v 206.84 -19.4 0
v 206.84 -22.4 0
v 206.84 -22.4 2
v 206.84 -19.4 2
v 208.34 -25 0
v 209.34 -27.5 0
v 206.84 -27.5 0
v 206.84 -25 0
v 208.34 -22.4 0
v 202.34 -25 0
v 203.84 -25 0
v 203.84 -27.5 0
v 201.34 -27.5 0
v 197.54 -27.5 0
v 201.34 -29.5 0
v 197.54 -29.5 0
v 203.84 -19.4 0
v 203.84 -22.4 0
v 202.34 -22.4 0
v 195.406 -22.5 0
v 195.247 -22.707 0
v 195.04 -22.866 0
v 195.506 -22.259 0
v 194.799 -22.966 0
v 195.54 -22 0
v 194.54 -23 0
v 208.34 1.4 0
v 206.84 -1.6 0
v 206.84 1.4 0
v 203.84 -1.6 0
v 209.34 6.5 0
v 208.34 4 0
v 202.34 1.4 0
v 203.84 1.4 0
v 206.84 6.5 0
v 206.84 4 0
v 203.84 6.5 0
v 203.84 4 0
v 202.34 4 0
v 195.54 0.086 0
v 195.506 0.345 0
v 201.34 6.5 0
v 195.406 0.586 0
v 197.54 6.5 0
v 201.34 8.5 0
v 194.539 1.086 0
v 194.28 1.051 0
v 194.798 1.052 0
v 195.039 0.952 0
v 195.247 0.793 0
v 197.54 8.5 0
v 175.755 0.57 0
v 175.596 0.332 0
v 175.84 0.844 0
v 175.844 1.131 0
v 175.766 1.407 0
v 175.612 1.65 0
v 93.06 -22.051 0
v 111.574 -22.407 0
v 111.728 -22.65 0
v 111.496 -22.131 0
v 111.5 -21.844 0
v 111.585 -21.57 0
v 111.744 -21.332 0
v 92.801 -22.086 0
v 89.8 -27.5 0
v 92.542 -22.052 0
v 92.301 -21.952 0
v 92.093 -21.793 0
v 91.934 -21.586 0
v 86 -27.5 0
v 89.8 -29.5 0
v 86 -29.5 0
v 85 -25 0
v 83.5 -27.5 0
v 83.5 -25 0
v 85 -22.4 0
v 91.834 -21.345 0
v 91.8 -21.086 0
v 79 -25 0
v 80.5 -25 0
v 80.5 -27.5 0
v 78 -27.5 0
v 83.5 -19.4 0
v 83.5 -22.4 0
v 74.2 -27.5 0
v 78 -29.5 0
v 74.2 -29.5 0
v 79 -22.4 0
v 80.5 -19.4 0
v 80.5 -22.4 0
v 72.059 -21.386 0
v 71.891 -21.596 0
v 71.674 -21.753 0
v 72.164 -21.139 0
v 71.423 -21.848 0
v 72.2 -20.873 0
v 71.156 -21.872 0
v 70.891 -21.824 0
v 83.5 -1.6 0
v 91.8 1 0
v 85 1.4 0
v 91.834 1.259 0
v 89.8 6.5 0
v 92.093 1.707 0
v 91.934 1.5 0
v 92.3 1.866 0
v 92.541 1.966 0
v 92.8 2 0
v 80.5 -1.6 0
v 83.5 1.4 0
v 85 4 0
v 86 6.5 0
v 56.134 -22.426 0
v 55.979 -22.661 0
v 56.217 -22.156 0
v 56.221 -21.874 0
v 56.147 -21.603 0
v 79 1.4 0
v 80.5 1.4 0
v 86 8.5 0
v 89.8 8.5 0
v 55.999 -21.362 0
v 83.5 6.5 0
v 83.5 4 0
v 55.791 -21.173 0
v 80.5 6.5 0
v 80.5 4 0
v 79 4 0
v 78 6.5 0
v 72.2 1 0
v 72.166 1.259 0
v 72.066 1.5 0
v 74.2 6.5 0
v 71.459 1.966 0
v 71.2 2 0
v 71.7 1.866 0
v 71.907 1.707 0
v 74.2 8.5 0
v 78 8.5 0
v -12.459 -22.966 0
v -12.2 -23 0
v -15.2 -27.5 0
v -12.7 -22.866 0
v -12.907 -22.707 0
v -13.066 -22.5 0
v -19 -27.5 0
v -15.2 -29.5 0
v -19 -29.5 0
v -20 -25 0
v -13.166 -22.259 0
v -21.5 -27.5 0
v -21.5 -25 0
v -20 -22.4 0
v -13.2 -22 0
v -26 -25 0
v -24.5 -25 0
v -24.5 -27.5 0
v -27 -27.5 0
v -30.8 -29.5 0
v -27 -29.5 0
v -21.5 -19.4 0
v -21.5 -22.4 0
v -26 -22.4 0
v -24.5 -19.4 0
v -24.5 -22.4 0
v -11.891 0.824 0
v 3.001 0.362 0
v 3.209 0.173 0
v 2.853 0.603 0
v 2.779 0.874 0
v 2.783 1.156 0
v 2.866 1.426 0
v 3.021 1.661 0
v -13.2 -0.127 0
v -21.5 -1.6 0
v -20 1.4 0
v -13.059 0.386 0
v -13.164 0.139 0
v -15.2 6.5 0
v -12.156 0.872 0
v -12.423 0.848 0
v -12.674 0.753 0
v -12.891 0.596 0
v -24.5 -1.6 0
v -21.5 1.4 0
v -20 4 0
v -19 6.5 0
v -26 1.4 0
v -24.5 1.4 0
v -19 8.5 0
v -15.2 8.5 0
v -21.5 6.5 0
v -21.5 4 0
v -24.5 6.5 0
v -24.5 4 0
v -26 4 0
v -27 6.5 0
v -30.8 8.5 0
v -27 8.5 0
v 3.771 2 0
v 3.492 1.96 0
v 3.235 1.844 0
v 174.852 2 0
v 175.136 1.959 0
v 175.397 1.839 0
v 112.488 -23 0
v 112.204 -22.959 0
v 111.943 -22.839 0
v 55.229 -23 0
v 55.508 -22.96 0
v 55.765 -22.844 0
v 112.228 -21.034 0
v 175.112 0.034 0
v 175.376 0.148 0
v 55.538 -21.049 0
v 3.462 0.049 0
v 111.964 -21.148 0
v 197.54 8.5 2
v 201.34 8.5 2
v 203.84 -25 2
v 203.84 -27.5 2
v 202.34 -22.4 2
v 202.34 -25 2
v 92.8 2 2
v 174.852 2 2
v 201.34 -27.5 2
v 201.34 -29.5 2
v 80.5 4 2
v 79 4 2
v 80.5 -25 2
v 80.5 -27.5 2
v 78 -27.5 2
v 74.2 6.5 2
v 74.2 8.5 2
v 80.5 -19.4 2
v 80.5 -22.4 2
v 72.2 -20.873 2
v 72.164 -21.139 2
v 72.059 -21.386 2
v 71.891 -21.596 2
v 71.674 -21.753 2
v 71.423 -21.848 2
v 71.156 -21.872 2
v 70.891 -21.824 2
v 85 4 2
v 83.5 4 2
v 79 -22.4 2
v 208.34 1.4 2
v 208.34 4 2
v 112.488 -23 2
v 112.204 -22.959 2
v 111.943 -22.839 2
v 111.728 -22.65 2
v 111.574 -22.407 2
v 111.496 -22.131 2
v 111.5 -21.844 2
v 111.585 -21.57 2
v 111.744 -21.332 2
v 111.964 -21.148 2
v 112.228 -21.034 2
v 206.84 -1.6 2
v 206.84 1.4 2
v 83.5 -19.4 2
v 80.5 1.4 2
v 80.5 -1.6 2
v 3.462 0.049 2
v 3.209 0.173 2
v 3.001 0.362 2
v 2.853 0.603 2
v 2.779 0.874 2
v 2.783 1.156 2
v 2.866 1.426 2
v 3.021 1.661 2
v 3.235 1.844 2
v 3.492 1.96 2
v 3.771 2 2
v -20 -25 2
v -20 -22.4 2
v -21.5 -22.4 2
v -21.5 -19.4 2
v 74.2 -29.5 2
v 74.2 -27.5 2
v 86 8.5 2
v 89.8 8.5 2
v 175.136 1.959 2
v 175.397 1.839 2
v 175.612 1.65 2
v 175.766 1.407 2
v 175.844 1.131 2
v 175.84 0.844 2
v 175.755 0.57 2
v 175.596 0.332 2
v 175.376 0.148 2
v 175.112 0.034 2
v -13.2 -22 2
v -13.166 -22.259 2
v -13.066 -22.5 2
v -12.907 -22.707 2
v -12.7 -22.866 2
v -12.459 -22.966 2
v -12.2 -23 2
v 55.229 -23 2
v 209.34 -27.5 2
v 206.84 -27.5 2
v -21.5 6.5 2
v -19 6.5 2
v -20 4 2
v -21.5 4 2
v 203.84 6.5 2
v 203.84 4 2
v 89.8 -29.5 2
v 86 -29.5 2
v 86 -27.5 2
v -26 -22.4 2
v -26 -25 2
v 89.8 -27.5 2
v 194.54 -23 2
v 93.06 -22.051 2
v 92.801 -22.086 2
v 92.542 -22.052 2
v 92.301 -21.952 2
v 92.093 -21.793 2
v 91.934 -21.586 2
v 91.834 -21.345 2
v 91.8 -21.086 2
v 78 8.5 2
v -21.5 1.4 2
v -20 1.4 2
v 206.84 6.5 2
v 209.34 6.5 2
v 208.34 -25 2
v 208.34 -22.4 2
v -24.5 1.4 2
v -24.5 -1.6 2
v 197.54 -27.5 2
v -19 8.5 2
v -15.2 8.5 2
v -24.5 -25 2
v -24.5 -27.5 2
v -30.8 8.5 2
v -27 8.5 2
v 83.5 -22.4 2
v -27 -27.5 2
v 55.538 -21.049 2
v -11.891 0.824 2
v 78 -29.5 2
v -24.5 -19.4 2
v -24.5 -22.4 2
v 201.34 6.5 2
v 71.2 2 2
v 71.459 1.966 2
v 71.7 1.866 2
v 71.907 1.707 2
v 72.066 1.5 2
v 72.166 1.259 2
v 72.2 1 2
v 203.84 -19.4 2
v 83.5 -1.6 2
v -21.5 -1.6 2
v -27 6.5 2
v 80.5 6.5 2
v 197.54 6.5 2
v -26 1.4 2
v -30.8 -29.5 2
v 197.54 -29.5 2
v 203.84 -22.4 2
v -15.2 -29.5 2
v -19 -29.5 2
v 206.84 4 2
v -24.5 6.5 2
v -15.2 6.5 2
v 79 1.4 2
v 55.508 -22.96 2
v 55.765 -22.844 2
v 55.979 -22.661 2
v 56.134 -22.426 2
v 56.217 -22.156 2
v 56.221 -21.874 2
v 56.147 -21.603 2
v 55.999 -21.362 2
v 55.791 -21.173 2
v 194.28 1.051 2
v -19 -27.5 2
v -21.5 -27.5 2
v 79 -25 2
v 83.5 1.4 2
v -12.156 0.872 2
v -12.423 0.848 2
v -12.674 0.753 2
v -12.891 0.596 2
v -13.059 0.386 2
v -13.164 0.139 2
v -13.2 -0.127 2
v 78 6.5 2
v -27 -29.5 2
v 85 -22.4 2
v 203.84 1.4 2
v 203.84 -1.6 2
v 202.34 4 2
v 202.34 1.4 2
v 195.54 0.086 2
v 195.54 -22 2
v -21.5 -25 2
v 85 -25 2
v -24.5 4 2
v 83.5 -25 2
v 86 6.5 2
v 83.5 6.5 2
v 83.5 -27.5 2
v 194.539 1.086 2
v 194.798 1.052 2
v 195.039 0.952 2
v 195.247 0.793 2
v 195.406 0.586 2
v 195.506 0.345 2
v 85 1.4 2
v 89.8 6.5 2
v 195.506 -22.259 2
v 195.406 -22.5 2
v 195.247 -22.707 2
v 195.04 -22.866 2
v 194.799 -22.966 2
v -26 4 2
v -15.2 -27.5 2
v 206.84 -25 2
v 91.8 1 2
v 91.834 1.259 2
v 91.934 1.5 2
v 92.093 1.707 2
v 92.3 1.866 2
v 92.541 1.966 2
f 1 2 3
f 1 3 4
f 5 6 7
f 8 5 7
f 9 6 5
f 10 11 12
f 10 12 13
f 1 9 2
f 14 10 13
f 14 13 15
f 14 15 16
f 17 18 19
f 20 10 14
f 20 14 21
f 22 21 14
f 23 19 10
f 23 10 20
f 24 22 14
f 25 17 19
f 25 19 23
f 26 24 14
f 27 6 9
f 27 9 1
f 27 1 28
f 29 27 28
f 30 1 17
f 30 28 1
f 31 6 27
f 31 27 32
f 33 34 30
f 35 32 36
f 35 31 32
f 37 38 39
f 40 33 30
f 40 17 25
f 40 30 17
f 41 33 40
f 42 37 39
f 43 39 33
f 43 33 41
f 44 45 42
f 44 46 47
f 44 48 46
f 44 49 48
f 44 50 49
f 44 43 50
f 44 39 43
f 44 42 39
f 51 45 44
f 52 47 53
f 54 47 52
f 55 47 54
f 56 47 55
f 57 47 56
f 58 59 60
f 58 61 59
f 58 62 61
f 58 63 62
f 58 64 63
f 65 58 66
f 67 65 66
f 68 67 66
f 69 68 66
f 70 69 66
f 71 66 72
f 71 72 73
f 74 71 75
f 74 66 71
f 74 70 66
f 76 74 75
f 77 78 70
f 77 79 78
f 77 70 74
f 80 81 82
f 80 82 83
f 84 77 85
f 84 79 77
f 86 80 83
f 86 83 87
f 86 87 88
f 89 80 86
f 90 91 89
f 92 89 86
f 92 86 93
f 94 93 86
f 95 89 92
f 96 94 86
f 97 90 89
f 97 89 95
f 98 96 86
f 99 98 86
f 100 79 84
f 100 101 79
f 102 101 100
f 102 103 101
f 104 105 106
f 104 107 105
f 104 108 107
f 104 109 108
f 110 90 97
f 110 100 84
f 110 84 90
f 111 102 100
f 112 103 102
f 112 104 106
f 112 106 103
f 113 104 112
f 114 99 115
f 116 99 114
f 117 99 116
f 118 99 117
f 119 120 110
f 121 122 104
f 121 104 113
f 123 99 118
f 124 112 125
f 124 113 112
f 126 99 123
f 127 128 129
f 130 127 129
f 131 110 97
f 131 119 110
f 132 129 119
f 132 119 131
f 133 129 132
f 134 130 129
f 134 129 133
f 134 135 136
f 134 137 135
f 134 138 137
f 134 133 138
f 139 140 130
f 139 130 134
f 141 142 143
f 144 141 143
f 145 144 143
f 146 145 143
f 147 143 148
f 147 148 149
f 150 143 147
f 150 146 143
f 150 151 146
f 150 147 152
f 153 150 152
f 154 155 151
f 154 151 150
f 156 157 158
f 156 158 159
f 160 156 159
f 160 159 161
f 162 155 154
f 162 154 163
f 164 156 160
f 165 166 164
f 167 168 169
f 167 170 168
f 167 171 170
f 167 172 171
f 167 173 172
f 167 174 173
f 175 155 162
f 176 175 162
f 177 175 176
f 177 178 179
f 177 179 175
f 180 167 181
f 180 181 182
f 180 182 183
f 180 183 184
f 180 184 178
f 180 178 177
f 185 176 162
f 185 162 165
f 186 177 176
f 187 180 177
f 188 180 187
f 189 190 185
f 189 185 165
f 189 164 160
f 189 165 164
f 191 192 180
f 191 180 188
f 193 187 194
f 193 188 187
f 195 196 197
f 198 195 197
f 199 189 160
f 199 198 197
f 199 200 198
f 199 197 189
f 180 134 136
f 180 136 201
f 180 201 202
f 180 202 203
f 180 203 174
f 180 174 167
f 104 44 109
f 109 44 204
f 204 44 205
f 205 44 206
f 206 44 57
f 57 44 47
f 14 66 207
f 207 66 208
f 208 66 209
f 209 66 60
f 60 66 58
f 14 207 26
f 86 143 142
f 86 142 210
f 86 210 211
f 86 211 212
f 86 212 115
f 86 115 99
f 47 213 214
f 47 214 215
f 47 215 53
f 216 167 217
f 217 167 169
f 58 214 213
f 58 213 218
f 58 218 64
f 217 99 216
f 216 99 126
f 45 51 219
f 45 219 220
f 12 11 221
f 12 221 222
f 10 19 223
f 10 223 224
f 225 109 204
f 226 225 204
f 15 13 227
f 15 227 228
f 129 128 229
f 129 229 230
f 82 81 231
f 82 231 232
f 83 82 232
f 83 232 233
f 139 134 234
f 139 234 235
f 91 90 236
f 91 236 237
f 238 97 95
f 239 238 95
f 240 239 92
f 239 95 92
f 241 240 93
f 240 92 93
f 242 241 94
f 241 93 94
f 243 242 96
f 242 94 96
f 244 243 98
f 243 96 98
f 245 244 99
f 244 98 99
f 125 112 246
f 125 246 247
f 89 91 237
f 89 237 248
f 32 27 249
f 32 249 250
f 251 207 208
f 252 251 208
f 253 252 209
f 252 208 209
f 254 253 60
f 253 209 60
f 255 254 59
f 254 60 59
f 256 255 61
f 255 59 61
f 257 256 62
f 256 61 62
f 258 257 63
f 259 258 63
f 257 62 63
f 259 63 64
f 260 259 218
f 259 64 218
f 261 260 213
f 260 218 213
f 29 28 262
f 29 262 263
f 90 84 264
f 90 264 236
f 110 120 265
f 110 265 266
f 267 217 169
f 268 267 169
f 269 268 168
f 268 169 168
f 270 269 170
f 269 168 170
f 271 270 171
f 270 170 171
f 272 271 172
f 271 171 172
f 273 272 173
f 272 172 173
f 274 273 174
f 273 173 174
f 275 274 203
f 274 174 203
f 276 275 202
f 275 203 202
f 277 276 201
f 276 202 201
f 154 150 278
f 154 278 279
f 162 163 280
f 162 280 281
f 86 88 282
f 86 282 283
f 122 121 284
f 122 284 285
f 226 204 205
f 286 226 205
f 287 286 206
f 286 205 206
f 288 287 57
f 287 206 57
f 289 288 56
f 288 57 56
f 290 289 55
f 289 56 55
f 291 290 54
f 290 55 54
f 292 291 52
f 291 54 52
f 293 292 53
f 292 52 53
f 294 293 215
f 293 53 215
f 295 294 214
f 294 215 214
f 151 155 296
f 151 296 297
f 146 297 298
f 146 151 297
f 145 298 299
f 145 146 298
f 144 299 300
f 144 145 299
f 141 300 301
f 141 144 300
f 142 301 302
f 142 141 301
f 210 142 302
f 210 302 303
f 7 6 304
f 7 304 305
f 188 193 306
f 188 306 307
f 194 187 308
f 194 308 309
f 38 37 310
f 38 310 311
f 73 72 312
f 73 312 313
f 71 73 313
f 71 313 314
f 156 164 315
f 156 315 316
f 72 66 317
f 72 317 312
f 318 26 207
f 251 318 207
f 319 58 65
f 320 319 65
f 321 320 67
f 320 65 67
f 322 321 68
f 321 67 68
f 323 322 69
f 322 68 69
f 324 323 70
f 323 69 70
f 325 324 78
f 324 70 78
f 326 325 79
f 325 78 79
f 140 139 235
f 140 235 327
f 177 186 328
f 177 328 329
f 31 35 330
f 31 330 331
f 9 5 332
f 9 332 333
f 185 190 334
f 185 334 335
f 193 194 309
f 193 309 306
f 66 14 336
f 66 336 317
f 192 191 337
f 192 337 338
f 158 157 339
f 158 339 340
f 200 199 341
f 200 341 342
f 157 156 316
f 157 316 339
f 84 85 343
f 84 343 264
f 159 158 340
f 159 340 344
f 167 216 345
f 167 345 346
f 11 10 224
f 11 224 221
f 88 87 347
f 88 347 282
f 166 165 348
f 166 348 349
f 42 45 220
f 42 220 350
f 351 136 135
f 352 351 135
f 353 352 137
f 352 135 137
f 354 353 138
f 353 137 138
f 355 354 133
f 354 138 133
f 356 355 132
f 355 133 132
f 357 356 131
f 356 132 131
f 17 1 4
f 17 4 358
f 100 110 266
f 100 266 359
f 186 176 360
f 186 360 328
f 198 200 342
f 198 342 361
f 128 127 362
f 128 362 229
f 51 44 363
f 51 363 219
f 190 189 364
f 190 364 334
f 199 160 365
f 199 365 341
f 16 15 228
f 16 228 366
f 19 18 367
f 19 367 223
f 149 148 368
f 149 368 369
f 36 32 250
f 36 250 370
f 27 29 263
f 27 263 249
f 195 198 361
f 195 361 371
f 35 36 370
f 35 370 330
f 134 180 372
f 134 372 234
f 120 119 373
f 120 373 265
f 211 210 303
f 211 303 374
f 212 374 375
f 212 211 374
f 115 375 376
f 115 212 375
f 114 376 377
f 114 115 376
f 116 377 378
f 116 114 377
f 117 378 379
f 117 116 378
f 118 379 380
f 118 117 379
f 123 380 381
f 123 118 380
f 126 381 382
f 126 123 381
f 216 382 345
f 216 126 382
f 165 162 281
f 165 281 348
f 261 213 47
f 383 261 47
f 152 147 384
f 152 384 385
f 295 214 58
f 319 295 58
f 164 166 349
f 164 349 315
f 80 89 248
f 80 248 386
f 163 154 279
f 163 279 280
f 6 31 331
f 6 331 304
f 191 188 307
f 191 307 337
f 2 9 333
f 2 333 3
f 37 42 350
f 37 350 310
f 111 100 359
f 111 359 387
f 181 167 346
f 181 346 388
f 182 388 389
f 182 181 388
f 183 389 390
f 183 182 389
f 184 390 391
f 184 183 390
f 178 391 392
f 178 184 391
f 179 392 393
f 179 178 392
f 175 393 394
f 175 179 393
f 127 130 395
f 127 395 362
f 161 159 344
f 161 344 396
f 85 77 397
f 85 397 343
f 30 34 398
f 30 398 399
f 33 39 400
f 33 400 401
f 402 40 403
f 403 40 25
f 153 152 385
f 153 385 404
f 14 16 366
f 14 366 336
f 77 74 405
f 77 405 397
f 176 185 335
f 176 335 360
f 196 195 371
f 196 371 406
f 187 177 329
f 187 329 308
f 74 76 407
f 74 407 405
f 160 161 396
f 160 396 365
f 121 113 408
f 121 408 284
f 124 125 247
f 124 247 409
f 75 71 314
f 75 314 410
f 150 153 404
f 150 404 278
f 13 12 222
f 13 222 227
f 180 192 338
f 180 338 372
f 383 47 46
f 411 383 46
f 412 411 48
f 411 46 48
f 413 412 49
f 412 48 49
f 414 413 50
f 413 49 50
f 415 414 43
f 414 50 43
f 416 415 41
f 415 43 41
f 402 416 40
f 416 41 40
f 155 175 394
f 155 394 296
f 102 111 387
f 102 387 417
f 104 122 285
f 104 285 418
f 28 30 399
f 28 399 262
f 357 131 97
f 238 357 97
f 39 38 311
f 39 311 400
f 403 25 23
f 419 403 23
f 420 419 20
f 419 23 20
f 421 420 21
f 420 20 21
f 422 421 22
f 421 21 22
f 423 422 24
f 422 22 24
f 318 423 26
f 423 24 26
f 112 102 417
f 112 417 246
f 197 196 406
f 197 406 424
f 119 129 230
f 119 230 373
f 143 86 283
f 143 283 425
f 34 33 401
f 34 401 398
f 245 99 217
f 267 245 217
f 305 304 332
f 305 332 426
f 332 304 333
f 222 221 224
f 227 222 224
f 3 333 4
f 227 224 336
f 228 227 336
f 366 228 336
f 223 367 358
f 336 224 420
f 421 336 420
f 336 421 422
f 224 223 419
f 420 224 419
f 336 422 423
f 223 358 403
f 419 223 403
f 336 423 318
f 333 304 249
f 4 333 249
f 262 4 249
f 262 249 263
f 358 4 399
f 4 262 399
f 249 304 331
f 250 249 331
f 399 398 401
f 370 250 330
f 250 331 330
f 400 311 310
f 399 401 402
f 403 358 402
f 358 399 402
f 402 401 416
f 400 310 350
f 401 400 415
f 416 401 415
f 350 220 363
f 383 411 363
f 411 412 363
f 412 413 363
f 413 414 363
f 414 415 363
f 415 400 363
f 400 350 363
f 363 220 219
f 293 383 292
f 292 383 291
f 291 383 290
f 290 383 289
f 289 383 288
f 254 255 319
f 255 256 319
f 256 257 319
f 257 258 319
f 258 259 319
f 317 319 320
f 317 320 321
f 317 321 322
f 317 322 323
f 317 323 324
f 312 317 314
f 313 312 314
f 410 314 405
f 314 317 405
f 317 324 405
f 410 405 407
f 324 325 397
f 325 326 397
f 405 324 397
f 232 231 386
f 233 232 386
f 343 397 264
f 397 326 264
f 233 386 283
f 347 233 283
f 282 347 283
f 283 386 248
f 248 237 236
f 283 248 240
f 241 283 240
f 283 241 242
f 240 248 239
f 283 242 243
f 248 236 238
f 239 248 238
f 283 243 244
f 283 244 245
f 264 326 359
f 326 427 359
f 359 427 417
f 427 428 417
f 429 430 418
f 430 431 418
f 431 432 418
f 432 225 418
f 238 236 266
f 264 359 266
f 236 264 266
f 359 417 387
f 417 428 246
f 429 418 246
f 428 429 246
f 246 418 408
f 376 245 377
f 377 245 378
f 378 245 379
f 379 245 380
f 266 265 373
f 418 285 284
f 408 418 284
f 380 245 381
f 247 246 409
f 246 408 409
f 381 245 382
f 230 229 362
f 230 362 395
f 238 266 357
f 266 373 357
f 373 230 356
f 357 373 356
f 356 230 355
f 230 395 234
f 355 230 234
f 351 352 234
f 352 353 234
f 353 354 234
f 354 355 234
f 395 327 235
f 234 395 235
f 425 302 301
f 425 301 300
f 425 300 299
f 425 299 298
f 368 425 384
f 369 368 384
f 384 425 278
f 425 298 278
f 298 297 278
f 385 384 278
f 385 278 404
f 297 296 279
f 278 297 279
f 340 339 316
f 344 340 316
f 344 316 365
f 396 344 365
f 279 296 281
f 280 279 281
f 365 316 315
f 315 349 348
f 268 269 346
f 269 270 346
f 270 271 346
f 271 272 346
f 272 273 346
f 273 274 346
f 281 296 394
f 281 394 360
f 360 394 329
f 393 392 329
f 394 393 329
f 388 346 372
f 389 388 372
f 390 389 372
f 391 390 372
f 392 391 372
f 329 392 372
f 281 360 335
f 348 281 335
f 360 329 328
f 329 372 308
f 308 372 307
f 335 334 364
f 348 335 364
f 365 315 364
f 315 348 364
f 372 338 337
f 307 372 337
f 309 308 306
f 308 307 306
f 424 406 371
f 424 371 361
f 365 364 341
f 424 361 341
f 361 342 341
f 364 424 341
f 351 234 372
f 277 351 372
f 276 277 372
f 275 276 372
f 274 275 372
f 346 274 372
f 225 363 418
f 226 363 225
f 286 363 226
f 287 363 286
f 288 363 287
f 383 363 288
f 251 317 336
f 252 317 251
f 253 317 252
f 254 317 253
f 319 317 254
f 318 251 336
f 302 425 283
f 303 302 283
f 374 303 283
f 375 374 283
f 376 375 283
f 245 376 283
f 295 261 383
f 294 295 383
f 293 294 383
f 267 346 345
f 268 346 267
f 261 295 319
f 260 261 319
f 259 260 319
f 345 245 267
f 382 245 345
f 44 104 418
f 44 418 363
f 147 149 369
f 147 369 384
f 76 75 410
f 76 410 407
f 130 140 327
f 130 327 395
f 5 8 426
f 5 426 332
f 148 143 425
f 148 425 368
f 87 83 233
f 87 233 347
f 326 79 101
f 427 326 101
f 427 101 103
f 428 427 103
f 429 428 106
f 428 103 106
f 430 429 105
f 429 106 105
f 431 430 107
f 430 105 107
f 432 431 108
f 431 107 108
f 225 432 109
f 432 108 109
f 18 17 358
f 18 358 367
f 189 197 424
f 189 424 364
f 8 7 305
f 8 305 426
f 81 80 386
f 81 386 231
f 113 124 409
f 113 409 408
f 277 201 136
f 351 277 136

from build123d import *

# Parameters (mm, degrees)
EXTRUDE_1_DEPTH = 2


with BuildPart() as part:
    # 草图2 → 凸台-拉伸1 (new body)
    with BuildSketch(Plane.XY):
        Polygon((-15.2, 6.5), (74.2, 6.5), (74.2, 8.5), (78, 8.5), (78, 6.5), (80.5, 6.5), (80.5, 4), (79, 4), (79, 1.4), (80.5, 1.4), (80.5, -1.6), (83.5, -1.6), (83.5, 1.4), (85, 1.4), (85, 4), (83.5, 4), (83.5, 6.5), (86, 6.5), (86, 8.5), (89.8, 8.5), (89.8, 6.5), (197.54, 6.5), (197.54, 8.5), (201.34, 8.5), (201.34, 6.5), (203.84, 6.5), (203.84, 4), (202.34, 4), (202.34, 1.4), (203.84, 1.4), (203.84, -1.6), (206.84, -1.6), (206.84, 1.4), (208.34, 1.4), (208.34, 4), (206.84, 4), (206.84, 6.5), (209.34, 6.5), (209.34, -27.5), (206.84, -27.5), (206.84, -25), (208.34, -25), (208.34, -22.4), (206.84, -22.4), (206.84, -19.4), (203.84, -19.4), (203.84, -22.4), (202.34, -22.4), (202.34, -25), (203.84, -25), (203.84, -27.5), (201.34, -27.5), (201.34, -29.5), (197.54, -29.5), (197.54, -27.5), (89.8, -27.5), (89.8, -29.5), (86, -29.5), (86, -27.5), (83.5, -27.5), (83.5, -25), (85, -25), (85, -22.4), (83.5, -22.4), (83.5, -19.4), (80.5, -19.4), (80.5, -22.4), (79, -22.4), (79, -25), (80.5, -25), (80.5, -27.5), (78, -27.5), (78, -29.5), (74.2, -29.5), (74.2, -27.5), (-15.2, -27.5), (-15.2, -29.5), (-19, -29.5), (-19, -27.5), (-21.5, -27.5), (-21.5, -25), (-20, -25), (-20, -22.4), (-21.5, -22.4), (-21.5, -19.4), (-24.5, -19.4), (-24.5, -22.4), (-26, -22.4), (-26, -25), (-24.5, -25), (-24.5, -27.5), (-27, -27.5), (-27, -29.5), (-30.8, -29.5), (-30.8, 8.5), (-27, 8.5), (-27, 6.5), (-24.5, 6.5), (-24.5, 4), (-26, 4), (-26, 1.4), (-24.5, 1.4), (-24.5, -1.6), (-21.5, -1.6), (-21.5, 1.4), (-20, 1.4), (-20, 4), (-21.5, 4), (-21.5, 6.5), (-19, 6.5), (-19, 8.5), (-15.2, 8.5), align=None)
        with BuildLine():
            Line((3.770961007, 2), (71.2, 2))
            ThreePointArc((71.2, 2), (71.907106781, 1.707106781), (72.2, 1))
            Line((72.2, 1), (72.2, -20.872954483))
            ThreePointArc((72.2, -20.872954483), (71.787980979, -21.681829238), (70.891443263, -21.824160423))
            Line((70.891443263, -21.824160423), (3.46240427, 0.04879406))
            ThreePointArc((3.46240427, 0.04879406), (2.783234845, 1.156195487), (3.770961007, 2))
        make_face(mode=Mode.SUBTRACT)
        with BuildLine():
            Line((92.8, 2), (174.852275232, 2))
            ThreePointArc((174.852275232, 2), (175.843645832, 1.131089029), (175.11219085, 0.034368667))
            Line((175.11219085, 0.034368667), (93.059915618, -22.051356057))
            ThreePointArc((93.059915618, -22.051356057), (92.191689067, -21.879423539), (91.8, -21.085724724))
            Line((91.8, -21.085724724), (91.8, 1))
            ThreePointArc((91.8, 1), (92.092893219, 1.707106781), (92.8, 2))
        make_face(mode=Mode.SUBTRACT)
        with BuildLine():
            Line((112.22780915, -21.034368667), (194.280084382, 1.051356057))
            ThreePointArc((194.280084382, 1.051356057), (195.148310933, 0.879423539), (195.54, 0.085724724))
            Line((195.54, 0.085724724), (195.54, -22))
            ThreePointArc((195.54, -22), (195.247106781, -22.707106781), (194.54, -23))
            Line((194.54, -23), (112.487724768, -23))
            ThreePointArc((112.487724768, -23), (111.496354168, -22.131089029), (112.22780915, -21.034368667))
        make_face(mode=Mode.SUBTRACT)
        with BuildLine():
            Line((-13.2, -0.127045517), (-13.2, -22))
            ThreePointArc((-13.2, -22), (-12.907106781, -22.707106781), (-12.2, -23))
            Line((-12.2, -23), (55.229038993, -23))
            ThreePointArc((55.229038993, -23), (56.216765155, -22.156195487), (55.53759573, -21.04879406))
            Line((55.53759573, -21.04879406), (-11.891443263, 0.824160423))
            ThreePointArc((-11.891443263, 0.824160423), (-12.787980979, 0.681829238), (-13.2, -0.127045517))
        make_face(mode=Mode.SUBTRACT)
    extrude(amount=EXTRUDE_1_DEPTH)


solid = part.part
